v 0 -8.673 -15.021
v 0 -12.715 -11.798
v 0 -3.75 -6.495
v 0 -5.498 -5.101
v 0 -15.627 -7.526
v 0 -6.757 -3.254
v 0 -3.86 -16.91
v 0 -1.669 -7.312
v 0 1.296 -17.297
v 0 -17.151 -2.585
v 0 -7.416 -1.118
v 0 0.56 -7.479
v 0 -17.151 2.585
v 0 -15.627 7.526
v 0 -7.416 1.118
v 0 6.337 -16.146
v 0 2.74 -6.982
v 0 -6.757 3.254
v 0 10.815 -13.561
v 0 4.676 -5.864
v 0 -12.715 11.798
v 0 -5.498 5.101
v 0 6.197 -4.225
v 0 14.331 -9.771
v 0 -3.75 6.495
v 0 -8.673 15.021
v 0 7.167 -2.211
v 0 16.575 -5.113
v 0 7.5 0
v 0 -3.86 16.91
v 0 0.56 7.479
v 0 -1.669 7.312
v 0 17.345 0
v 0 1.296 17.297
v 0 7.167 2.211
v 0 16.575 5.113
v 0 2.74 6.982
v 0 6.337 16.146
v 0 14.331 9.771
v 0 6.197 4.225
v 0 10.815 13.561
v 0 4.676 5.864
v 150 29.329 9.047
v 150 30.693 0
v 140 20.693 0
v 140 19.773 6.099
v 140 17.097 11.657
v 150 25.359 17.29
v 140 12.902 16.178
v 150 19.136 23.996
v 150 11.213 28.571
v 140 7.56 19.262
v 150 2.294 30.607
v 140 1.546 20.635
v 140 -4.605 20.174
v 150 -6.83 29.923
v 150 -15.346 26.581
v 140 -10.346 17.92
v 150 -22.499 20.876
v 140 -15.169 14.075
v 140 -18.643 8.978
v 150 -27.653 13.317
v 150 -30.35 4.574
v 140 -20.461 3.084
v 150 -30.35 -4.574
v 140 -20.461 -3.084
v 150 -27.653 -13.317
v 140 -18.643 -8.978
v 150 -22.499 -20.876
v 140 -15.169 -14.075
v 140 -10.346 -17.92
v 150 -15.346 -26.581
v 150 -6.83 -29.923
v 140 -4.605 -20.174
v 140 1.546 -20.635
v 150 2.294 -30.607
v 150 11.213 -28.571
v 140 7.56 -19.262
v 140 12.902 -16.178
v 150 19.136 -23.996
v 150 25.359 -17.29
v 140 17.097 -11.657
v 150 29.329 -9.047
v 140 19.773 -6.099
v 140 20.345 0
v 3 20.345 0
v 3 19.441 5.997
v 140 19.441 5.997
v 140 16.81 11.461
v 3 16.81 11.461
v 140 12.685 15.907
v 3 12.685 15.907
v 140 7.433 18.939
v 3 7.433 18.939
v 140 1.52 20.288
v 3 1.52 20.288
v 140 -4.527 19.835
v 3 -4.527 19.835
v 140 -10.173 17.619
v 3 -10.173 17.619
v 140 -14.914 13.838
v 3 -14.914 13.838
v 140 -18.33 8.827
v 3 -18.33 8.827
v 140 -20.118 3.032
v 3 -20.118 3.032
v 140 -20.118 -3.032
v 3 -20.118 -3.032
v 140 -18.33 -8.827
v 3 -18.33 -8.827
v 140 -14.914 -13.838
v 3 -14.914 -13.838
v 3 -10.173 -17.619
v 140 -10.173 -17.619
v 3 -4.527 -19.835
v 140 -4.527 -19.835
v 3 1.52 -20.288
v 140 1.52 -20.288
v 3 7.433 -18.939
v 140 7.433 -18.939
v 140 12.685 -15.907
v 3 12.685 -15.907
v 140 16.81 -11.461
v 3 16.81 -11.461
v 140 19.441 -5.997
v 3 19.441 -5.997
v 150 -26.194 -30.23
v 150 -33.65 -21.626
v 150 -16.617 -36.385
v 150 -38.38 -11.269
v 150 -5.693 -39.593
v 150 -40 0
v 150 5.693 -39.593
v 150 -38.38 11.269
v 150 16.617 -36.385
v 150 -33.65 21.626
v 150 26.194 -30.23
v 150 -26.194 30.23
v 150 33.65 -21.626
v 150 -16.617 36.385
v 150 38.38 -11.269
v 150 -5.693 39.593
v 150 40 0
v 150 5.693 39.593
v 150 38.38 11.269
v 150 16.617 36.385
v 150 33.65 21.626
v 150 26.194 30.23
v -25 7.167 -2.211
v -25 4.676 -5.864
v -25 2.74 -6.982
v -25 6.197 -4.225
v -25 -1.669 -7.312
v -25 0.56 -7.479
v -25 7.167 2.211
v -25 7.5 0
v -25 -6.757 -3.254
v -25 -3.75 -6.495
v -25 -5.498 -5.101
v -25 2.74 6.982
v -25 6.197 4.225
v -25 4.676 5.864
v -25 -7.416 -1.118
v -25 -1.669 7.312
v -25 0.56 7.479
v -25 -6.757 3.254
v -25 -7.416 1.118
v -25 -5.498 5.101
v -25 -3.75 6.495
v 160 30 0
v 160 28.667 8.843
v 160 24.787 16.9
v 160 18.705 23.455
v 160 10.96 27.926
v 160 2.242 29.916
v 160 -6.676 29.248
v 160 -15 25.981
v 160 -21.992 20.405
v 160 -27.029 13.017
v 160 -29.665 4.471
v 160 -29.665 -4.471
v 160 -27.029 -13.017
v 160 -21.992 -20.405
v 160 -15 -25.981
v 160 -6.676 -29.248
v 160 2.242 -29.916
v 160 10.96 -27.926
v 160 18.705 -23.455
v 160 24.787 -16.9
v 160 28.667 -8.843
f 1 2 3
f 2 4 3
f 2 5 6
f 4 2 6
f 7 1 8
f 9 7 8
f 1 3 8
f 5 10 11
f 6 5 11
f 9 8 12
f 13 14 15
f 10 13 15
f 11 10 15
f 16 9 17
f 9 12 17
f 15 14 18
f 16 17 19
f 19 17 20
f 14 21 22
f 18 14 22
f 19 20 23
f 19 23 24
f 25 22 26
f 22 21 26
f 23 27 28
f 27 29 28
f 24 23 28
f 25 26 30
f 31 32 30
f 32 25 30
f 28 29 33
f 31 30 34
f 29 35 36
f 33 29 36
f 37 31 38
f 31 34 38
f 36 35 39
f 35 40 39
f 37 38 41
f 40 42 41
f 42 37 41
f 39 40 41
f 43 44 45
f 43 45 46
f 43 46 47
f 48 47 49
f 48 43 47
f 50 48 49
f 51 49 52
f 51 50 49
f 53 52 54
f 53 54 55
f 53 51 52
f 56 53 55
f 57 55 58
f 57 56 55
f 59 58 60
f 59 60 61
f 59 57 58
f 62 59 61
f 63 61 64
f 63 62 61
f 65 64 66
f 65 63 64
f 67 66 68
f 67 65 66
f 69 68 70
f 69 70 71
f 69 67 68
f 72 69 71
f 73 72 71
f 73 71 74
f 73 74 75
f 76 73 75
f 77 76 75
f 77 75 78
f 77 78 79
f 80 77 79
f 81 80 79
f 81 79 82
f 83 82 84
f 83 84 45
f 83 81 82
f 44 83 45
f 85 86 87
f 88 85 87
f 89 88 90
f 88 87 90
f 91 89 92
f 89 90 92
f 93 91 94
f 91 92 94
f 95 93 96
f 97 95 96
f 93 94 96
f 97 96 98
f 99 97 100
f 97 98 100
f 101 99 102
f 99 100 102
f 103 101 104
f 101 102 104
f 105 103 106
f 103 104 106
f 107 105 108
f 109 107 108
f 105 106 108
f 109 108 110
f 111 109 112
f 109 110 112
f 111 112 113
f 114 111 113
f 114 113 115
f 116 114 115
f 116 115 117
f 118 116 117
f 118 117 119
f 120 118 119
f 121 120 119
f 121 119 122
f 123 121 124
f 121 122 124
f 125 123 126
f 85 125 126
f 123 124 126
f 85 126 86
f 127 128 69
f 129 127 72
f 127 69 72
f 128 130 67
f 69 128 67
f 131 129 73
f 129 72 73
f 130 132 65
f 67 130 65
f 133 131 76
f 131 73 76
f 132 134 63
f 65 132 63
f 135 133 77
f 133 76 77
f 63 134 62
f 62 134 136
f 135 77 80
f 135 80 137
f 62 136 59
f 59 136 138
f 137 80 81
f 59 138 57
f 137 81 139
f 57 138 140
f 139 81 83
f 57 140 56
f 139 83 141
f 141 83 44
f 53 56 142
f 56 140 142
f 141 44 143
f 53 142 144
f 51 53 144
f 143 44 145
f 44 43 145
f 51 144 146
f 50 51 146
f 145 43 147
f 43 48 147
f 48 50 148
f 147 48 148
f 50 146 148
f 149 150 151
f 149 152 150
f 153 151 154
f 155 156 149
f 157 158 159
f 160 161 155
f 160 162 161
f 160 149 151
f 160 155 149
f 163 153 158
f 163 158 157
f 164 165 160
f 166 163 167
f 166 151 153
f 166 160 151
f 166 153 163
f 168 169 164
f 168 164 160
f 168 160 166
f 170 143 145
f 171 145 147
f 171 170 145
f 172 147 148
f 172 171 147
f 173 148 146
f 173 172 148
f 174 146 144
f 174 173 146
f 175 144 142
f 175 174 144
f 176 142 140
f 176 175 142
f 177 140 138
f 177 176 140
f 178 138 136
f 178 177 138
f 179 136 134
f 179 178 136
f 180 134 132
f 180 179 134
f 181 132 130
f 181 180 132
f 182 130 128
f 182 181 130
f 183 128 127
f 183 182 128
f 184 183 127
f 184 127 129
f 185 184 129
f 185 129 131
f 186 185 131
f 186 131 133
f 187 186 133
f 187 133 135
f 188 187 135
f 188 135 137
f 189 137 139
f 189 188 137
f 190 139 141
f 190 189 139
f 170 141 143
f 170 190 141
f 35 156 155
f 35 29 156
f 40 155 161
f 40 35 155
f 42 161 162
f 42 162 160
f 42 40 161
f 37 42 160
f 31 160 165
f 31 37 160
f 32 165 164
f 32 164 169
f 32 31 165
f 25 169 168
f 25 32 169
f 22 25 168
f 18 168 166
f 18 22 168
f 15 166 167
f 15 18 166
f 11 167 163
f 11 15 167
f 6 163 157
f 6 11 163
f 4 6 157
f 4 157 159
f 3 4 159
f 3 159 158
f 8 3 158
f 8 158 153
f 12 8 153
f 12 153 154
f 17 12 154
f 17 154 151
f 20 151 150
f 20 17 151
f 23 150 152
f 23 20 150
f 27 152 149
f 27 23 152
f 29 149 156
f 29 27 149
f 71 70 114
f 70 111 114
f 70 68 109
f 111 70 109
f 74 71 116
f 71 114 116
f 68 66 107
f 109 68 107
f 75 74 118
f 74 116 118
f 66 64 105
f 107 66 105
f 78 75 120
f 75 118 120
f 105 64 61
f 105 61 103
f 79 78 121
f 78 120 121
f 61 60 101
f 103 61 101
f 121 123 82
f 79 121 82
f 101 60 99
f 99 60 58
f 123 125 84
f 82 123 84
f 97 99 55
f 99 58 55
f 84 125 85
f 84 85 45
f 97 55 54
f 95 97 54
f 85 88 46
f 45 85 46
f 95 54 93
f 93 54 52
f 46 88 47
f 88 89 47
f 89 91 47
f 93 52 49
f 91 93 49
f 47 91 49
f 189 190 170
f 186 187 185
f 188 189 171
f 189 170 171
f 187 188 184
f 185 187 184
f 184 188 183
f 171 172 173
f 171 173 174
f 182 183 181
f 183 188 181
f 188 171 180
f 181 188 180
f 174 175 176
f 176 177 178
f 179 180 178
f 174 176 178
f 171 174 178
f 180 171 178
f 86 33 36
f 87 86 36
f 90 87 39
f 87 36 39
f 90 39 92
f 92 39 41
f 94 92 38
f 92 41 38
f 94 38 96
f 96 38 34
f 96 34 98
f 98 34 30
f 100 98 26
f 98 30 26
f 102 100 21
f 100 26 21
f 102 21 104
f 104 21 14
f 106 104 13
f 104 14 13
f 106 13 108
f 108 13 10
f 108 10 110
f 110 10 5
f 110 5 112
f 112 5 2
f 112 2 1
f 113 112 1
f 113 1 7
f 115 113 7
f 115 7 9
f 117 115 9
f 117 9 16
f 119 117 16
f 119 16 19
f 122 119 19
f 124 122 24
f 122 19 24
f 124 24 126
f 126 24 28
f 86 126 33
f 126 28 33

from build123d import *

# Parameters (mm, degrees)
F0_W     = 25
F0_H     = 7.5
F2_SIZE2 = 3
F2_SIZE  = 3
F3_SIZE2 = 9.99999
F3_SIZE  = 9.99999
F4_SIZE2 = 9.99999
F4_SIZE  = 9.99999


# Not quite as in the source:
# - a fillet or chamfer is up to 0.001 mm smaller than in the source, because OpenCascade refuses the exact size


with BuildPart() as f1:
    # F0 (on Top) → F1 (revolve)
    with BuildSketch(Plane.XY):
        with Locations((-12.5, 3.75)):
            Rectangle(F0_W, F0_H)
        Polygon((0, 7.5), (0, 0), (140, 0), (140, 20.3452128917), (0, 20.3452128917), align=None)
        Polygon((140, 20.3452128917), (140, 0), (150, 0), (150, 30.6925382465), (140, 30.6925382465), align=None)
        Polygon((150, 30.6925382465), (150, 0), (160, 0), (160, 40), (150, 40), align=None)
    revolve(axis=Axis((70, 0, 0), (1, 0, 0)))

    # F2
    f2_edges = [f1.edges().sort_by_distance(p)[0] for p in [
        (0, -20.345213, 0),
    ]]
    chamfer(f2_edges, length=F2_SIZE, length2=F2_SIZE2)

    # F3 (size 10 and 10 in the source; OpenCascade refuses exactly that, so slightly less here)
    f3_edges = [f1.edges().sort_by_distance(p)[0] for p in [
        (140, -30.692538, 0),
    ]]
    chamfer(f3_edges, length=F3_SIZE, length2=F3_SIZE2)

    # F4 (size 10 and 10 in the source; OpenCascade refuses exactly that, so slightly less here)
    f4_edges = [f1.edges().sort_by_distance(p)[0] for p in [
        (160, -40, 0),
    ]]
    chamfer(f4_edges, length=F4_SIZE, length2=F4_SIZE2)


solid = f1.part
